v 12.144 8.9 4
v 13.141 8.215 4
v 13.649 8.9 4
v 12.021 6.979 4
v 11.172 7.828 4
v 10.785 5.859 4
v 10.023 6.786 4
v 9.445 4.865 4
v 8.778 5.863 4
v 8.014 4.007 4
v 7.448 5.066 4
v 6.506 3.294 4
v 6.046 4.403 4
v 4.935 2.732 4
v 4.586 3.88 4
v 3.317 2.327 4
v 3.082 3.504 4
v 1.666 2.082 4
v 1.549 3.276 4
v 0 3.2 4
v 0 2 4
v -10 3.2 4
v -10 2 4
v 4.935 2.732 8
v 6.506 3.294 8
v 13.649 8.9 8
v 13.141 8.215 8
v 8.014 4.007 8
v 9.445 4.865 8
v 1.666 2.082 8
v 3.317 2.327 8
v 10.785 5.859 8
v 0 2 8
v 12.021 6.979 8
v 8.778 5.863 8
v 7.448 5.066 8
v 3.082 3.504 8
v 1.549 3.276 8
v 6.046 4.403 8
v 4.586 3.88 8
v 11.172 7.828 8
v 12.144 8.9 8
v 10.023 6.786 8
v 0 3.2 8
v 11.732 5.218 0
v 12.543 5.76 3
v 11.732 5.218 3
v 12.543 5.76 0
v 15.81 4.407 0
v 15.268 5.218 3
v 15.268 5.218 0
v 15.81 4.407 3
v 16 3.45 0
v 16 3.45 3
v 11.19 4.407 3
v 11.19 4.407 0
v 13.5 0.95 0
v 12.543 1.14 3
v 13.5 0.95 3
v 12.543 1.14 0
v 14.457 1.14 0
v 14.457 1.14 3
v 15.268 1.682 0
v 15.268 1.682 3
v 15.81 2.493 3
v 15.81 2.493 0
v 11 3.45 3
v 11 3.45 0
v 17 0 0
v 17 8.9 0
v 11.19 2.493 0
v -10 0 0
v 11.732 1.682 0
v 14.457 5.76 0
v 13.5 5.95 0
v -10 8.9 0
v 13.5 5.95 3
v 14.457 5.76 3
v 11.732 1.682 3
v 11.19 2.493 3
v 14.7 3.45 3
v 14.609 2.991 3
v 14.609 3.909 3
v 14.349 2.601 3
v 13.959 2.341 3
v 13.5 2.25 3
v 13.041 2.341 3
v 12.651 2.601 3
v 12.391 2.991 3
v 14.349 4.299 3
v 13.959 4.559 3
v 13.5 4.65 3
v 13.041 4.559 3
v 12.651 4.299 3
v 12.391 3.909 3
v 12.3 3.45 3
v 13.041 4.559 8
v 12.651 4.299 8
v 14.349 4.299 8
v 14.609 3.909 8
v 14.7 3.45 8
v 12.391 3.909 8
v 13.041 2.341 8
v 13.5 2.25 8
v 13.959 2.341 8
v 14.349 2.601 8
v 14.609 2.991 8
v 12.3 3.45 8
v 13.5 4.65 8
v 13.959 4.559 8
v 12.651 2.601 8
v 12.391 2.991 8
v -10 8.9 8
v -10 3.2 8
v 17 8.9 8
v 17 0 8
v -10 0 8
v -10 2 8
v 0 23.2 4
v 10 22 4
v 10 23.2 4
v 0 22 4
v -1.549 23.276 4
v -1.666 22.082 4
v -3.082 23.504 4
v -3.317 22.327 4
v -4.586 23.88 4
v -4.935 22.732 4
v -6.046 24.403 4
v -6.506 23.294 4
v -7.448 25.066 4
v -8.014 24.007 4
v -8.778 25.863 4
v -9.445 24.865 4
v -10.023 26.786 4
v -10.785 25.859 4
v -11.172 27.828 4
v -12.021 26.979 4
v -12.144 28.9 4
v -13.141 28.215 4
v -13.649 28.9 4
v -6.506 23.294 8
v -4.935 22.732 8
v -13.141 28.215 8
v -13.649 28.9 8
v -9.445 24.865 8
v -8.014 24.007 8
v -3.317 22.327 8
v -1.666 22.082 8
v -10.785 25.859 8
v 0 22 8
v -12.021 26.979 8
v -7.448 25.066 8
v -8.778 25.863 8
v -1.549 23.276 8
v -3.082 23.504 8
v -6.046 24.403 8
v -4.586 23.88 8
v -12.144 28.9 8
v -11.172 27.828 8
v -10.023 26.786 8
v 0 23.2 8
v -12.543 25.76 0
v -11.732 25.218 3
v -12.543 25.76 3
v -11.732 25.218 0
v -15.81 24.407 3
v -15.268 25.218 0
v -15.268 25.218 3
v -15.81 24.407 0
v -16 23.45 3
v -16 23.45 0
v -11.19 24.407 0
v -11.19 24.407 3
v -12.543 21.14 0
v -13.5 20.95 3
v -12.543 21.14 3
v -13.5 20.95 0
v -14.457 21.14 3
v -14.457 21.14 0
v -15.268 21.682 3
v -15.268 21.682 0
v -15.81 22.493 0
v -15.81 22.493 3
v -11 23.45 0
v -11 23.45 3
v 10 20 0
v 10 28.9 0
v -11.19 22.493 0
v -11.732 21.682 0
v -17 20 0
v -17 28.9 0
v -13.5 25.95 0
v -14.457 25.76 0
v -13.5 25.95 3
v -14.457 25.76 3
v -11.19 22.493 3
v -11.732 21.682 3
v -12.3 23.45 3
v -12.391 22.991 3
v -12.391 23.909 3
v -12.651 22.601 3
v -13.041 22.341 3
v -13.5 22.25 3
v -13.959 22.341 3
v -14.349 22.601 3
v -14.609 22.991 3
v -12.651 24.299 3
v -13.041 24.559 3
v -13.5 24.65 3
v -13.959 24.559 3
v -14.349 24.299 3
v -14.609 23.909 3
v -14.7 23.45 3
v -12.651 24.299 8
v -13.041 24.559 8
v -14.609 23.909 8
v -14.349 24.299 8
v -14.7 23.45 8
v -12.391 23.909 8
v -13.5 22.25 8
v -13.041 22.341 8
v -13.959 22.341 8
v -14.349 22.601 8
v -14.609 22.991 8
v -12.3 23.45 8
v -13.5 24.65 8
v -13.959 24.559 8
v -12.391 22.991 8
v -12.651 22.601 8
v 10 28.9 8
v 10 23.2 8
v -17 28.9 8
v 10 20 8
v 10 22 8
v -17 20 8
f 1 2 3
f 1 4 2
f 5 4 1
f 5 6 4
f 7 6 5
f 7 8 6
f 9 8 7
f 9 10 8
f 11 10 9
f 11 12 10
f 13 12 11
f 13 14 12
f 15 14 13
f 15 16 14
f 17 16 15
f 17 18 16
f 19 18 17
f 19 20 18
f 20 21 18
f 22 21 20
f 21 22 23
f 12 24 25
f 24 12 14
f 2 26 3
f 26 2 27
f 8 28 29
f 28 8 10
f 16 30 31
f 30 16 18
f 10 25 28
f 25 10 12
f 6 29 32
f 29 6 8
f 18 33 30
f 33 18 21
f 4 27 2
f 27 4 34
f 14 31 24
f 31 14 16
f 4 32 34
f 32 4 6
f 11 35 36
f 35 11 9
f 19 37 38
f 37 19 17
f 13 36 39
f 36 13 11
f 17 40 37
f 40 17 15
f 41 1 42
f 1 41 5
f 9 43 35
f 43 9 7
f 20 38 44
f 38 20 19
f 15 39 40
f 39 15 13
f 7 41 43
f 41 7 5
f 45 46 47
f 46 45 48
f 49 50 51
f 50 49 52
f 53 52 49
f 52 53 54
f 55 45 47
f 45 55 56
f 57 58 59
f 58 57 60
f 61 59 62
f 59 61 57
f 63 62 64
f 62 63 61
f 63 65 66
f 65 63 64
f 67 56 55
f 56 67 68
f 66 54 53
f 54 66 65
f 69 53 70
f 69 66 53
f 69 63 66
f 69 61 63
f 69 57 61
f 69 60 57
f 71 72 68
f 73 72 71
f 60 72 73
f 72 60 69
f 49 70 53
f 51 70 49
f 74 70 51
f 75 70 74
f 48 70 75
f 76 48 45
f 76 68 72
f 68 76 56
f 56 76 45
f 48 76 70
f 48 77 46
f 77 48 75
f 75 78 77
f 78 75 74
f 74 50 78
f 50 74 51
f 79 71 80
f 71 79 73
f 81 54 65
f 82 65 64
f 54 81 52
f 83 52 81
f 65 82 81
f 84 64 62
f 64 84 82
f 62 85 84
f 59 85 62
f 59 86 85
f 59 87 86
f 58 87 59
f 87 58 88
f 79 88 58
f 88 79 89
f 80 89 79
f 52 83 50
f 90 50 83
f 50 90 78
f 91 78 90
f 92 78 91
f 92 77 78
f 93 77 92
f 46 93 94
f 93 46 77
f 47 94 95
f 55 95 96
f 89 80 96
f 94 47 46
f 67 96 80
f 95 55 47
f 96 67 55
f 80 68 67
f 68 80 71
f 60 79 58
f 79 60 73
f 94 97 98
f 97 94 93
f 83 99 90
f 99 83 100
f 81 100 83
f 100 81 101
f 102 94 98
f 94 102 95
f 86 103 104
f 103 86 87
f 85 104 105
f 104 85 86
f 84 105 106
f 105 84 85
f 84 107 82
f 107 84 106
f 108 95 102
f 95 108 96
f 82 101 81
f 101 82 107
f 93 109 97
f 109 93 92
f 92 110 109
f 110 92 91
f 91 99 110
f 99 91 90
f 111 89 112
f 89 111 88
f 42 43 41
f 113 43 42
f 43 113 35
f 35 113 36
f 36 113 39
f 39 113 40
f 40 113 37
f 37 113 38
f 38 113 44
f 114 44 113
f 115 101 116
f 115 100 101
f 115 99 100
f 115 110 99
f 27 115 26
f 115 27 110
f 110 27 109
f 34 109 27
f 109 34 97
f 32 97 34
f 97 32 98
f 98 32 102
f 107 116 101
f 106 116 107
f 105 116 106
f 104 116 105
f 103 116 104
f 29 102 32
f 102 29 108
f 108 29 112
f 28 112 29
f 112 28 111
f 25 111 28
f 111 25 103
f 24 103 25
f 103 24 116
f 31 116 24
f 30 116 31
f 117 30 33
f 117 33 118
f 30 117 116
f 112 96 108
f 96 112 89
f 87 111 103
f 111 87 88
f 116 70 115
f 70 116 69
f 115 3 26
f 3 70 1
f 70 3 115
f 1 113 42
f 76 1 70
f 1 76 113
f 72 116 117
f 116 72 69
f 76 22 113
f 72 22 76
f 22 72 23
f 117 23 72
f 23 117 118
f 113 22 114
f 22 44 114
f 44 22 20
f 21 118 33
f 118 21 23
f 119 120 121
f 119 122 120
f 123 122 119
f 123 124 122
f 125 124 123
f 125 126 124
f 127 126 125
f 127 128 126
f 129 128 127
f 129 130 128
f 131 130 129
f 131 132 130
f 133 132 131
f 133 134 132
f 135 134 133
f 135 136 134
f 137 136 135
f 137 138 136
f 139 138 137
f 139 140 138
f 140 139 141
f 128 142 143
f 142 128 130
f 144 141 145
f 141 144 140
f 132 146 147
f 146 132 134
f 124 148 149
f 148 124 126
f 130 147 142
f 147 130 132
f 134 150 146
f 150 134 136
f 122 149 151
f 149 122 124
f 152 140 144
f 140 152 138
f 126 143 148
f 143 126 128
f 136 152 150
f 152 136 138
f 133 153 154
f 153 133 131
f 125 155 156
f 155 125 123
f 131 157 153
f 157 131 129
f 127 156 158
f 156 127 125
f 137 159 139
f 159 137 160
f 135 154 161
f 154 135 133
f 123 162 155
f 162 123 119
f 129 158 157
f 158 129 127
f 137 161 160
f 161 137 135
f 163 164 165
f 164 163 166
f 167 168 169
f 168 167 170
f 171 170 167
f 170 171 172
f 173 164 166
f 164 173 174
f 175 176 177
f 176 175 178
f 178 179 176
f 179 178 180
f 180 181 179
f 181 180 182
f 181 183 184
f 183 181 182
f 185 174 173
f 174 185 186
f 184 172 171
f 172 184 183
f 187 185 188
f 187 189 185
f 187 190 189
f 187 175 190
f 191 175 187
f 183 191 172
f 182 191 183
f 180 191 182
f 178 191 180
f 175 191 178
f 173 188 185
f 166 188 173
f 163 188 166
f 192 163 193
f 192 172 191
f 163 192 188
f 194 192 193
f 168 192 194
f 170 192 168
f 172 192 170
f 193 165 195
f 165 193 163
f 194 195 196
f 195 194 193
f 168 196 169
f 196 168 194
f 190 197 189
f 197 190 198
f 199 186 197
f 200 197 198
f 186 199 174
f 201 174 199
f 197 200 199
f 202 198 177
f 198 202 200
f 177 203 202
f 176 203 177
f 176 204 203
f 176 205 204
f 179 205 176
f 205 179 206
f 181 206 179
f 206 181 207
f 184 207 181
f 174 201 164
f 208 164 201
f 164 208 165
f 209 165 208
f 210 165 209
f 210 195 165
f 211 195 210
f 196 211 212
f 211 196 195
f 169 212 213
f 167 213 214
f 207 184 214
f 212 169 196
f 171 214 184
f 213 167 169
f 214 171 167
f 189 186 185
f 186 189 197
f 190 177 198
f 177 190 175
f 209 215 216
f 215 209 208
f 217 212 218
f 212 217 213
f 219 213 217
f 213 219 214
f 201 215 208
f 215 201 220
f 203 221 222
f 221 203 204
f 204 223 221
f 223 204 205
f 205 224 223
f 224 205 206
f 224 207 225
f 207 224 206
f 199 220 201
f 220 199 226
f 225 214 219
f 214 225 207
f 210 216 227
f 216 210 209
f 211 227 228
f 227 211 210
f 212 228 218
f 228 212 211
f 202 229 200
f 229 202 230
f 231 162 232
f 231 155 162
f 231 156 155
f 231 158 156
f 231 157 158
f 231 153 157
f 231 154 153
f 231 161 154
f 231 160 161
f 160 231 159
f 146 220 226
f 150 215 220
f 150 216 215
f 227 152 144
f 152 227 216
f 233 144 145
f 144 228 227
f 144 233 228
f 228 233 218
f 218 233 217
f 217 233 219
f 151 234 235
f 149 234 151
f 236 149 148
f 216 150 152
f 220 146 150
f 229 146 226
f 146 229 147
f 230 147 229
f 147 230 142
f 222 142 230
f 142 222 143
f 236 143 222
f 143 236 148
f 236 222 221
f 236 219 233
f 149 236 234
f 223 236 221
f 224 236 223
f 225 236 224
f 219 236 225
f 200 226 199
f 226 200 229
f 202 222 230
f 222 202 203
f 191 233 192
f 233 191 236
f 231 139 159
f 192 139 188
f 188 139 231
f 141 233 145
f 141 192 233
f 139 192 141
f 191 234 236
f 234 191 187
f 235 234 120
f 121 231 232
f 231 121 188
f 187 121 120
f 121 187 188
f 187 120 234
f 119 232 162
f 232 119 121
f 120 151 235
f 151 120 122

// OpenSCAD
/*
Generic Action Camera Adapter for 3DR Solo
Copyright (C) 2016 - 2017  Hugh Eaves

This program is free software: you can redistribute it and/or modify
it under the terms of the GNU General Public License as published by
the Free Software Foundation, either version 3 of the License, or
(at your option) any later version.

This program is distributed in the hope that it will be useful,
but WITHOUT ANY WARRANTY; without even the implied warranty of
MERCHANTABILITY or FITNESS FOR A PARTICULAR PURPOSE.  See the
GNU General Public License for more details.

You should have received a copy of the GNU General Public License
along with this program.  If not, see <http://www.gnu.org/licenses/>.
*/

// Change this to change the weight
bracket_thickness = 2;
bracket_vertical_thickness = 4;
// makes the bracket longer
straight_section_length = 10; // can go up to 17mm and still fit


beam_curve_diameter = 34;
beam_thickness = 1.2;
beam_height = 4;
beam_width = 5.7;
beam_length = beam_curve_diameter / 2;

bracket_length = beam_length;
bracket_width = beam_width + bracket_thickness + beam_thickness;
bracket_height = beam_height + bracket_vertical_thickness;
bracket_depth = 3;


center_cutout_width = 1;
screw_thread_diameter = 2.4;
screw_head_diameter = 5;
screw_head_height = 3;

module curve_cutout() {
  difference() {
    cylinder(d = beam_curve_diameter, h = 100, $fn = 64);
    cylinder(d = beam_curve_diameter - (beam_thickness * 2), h = 100, $fn = 64);
  }
}

module side_weight() {
  difference() {
    union() {
      difference() {
            cube([bracket_length, bracket_width, bracket_height]);
        
        translate([0, beam_curve_diameter / 2 + bracket_thickness, bracket_vertical_thickness])
          curve_cutout();
        
        translate([bracket_length - screw_head_diameter / 2- 1,bracket_width / 2 - 1, 0]){ 
          
          cylinder(d = screw_head_diameter, h = screw_head_height, $fn = 16);
     
          cylinder(d = screw_thread_diameter, h = bracket_height, $fn = 16);
        }
      }
      translate([-straight_section_length, 0, 0])
        difference() {
          cube([straight_section_length, bracket_width, bracket_height]);
          
         translate([0, bracket_thickness, bracket_vertical_thickness])
            cube([straight_section_length, beam_thickness, 100]);
        }
    }
  }
}

side_weight();

translate([0,20,0]) mirror([1,0,0]) side_weight();

//  translate([0,beam_curve_diameter/2 + bracket_thickness,bracket_thickness])
//  curve_cutout();
